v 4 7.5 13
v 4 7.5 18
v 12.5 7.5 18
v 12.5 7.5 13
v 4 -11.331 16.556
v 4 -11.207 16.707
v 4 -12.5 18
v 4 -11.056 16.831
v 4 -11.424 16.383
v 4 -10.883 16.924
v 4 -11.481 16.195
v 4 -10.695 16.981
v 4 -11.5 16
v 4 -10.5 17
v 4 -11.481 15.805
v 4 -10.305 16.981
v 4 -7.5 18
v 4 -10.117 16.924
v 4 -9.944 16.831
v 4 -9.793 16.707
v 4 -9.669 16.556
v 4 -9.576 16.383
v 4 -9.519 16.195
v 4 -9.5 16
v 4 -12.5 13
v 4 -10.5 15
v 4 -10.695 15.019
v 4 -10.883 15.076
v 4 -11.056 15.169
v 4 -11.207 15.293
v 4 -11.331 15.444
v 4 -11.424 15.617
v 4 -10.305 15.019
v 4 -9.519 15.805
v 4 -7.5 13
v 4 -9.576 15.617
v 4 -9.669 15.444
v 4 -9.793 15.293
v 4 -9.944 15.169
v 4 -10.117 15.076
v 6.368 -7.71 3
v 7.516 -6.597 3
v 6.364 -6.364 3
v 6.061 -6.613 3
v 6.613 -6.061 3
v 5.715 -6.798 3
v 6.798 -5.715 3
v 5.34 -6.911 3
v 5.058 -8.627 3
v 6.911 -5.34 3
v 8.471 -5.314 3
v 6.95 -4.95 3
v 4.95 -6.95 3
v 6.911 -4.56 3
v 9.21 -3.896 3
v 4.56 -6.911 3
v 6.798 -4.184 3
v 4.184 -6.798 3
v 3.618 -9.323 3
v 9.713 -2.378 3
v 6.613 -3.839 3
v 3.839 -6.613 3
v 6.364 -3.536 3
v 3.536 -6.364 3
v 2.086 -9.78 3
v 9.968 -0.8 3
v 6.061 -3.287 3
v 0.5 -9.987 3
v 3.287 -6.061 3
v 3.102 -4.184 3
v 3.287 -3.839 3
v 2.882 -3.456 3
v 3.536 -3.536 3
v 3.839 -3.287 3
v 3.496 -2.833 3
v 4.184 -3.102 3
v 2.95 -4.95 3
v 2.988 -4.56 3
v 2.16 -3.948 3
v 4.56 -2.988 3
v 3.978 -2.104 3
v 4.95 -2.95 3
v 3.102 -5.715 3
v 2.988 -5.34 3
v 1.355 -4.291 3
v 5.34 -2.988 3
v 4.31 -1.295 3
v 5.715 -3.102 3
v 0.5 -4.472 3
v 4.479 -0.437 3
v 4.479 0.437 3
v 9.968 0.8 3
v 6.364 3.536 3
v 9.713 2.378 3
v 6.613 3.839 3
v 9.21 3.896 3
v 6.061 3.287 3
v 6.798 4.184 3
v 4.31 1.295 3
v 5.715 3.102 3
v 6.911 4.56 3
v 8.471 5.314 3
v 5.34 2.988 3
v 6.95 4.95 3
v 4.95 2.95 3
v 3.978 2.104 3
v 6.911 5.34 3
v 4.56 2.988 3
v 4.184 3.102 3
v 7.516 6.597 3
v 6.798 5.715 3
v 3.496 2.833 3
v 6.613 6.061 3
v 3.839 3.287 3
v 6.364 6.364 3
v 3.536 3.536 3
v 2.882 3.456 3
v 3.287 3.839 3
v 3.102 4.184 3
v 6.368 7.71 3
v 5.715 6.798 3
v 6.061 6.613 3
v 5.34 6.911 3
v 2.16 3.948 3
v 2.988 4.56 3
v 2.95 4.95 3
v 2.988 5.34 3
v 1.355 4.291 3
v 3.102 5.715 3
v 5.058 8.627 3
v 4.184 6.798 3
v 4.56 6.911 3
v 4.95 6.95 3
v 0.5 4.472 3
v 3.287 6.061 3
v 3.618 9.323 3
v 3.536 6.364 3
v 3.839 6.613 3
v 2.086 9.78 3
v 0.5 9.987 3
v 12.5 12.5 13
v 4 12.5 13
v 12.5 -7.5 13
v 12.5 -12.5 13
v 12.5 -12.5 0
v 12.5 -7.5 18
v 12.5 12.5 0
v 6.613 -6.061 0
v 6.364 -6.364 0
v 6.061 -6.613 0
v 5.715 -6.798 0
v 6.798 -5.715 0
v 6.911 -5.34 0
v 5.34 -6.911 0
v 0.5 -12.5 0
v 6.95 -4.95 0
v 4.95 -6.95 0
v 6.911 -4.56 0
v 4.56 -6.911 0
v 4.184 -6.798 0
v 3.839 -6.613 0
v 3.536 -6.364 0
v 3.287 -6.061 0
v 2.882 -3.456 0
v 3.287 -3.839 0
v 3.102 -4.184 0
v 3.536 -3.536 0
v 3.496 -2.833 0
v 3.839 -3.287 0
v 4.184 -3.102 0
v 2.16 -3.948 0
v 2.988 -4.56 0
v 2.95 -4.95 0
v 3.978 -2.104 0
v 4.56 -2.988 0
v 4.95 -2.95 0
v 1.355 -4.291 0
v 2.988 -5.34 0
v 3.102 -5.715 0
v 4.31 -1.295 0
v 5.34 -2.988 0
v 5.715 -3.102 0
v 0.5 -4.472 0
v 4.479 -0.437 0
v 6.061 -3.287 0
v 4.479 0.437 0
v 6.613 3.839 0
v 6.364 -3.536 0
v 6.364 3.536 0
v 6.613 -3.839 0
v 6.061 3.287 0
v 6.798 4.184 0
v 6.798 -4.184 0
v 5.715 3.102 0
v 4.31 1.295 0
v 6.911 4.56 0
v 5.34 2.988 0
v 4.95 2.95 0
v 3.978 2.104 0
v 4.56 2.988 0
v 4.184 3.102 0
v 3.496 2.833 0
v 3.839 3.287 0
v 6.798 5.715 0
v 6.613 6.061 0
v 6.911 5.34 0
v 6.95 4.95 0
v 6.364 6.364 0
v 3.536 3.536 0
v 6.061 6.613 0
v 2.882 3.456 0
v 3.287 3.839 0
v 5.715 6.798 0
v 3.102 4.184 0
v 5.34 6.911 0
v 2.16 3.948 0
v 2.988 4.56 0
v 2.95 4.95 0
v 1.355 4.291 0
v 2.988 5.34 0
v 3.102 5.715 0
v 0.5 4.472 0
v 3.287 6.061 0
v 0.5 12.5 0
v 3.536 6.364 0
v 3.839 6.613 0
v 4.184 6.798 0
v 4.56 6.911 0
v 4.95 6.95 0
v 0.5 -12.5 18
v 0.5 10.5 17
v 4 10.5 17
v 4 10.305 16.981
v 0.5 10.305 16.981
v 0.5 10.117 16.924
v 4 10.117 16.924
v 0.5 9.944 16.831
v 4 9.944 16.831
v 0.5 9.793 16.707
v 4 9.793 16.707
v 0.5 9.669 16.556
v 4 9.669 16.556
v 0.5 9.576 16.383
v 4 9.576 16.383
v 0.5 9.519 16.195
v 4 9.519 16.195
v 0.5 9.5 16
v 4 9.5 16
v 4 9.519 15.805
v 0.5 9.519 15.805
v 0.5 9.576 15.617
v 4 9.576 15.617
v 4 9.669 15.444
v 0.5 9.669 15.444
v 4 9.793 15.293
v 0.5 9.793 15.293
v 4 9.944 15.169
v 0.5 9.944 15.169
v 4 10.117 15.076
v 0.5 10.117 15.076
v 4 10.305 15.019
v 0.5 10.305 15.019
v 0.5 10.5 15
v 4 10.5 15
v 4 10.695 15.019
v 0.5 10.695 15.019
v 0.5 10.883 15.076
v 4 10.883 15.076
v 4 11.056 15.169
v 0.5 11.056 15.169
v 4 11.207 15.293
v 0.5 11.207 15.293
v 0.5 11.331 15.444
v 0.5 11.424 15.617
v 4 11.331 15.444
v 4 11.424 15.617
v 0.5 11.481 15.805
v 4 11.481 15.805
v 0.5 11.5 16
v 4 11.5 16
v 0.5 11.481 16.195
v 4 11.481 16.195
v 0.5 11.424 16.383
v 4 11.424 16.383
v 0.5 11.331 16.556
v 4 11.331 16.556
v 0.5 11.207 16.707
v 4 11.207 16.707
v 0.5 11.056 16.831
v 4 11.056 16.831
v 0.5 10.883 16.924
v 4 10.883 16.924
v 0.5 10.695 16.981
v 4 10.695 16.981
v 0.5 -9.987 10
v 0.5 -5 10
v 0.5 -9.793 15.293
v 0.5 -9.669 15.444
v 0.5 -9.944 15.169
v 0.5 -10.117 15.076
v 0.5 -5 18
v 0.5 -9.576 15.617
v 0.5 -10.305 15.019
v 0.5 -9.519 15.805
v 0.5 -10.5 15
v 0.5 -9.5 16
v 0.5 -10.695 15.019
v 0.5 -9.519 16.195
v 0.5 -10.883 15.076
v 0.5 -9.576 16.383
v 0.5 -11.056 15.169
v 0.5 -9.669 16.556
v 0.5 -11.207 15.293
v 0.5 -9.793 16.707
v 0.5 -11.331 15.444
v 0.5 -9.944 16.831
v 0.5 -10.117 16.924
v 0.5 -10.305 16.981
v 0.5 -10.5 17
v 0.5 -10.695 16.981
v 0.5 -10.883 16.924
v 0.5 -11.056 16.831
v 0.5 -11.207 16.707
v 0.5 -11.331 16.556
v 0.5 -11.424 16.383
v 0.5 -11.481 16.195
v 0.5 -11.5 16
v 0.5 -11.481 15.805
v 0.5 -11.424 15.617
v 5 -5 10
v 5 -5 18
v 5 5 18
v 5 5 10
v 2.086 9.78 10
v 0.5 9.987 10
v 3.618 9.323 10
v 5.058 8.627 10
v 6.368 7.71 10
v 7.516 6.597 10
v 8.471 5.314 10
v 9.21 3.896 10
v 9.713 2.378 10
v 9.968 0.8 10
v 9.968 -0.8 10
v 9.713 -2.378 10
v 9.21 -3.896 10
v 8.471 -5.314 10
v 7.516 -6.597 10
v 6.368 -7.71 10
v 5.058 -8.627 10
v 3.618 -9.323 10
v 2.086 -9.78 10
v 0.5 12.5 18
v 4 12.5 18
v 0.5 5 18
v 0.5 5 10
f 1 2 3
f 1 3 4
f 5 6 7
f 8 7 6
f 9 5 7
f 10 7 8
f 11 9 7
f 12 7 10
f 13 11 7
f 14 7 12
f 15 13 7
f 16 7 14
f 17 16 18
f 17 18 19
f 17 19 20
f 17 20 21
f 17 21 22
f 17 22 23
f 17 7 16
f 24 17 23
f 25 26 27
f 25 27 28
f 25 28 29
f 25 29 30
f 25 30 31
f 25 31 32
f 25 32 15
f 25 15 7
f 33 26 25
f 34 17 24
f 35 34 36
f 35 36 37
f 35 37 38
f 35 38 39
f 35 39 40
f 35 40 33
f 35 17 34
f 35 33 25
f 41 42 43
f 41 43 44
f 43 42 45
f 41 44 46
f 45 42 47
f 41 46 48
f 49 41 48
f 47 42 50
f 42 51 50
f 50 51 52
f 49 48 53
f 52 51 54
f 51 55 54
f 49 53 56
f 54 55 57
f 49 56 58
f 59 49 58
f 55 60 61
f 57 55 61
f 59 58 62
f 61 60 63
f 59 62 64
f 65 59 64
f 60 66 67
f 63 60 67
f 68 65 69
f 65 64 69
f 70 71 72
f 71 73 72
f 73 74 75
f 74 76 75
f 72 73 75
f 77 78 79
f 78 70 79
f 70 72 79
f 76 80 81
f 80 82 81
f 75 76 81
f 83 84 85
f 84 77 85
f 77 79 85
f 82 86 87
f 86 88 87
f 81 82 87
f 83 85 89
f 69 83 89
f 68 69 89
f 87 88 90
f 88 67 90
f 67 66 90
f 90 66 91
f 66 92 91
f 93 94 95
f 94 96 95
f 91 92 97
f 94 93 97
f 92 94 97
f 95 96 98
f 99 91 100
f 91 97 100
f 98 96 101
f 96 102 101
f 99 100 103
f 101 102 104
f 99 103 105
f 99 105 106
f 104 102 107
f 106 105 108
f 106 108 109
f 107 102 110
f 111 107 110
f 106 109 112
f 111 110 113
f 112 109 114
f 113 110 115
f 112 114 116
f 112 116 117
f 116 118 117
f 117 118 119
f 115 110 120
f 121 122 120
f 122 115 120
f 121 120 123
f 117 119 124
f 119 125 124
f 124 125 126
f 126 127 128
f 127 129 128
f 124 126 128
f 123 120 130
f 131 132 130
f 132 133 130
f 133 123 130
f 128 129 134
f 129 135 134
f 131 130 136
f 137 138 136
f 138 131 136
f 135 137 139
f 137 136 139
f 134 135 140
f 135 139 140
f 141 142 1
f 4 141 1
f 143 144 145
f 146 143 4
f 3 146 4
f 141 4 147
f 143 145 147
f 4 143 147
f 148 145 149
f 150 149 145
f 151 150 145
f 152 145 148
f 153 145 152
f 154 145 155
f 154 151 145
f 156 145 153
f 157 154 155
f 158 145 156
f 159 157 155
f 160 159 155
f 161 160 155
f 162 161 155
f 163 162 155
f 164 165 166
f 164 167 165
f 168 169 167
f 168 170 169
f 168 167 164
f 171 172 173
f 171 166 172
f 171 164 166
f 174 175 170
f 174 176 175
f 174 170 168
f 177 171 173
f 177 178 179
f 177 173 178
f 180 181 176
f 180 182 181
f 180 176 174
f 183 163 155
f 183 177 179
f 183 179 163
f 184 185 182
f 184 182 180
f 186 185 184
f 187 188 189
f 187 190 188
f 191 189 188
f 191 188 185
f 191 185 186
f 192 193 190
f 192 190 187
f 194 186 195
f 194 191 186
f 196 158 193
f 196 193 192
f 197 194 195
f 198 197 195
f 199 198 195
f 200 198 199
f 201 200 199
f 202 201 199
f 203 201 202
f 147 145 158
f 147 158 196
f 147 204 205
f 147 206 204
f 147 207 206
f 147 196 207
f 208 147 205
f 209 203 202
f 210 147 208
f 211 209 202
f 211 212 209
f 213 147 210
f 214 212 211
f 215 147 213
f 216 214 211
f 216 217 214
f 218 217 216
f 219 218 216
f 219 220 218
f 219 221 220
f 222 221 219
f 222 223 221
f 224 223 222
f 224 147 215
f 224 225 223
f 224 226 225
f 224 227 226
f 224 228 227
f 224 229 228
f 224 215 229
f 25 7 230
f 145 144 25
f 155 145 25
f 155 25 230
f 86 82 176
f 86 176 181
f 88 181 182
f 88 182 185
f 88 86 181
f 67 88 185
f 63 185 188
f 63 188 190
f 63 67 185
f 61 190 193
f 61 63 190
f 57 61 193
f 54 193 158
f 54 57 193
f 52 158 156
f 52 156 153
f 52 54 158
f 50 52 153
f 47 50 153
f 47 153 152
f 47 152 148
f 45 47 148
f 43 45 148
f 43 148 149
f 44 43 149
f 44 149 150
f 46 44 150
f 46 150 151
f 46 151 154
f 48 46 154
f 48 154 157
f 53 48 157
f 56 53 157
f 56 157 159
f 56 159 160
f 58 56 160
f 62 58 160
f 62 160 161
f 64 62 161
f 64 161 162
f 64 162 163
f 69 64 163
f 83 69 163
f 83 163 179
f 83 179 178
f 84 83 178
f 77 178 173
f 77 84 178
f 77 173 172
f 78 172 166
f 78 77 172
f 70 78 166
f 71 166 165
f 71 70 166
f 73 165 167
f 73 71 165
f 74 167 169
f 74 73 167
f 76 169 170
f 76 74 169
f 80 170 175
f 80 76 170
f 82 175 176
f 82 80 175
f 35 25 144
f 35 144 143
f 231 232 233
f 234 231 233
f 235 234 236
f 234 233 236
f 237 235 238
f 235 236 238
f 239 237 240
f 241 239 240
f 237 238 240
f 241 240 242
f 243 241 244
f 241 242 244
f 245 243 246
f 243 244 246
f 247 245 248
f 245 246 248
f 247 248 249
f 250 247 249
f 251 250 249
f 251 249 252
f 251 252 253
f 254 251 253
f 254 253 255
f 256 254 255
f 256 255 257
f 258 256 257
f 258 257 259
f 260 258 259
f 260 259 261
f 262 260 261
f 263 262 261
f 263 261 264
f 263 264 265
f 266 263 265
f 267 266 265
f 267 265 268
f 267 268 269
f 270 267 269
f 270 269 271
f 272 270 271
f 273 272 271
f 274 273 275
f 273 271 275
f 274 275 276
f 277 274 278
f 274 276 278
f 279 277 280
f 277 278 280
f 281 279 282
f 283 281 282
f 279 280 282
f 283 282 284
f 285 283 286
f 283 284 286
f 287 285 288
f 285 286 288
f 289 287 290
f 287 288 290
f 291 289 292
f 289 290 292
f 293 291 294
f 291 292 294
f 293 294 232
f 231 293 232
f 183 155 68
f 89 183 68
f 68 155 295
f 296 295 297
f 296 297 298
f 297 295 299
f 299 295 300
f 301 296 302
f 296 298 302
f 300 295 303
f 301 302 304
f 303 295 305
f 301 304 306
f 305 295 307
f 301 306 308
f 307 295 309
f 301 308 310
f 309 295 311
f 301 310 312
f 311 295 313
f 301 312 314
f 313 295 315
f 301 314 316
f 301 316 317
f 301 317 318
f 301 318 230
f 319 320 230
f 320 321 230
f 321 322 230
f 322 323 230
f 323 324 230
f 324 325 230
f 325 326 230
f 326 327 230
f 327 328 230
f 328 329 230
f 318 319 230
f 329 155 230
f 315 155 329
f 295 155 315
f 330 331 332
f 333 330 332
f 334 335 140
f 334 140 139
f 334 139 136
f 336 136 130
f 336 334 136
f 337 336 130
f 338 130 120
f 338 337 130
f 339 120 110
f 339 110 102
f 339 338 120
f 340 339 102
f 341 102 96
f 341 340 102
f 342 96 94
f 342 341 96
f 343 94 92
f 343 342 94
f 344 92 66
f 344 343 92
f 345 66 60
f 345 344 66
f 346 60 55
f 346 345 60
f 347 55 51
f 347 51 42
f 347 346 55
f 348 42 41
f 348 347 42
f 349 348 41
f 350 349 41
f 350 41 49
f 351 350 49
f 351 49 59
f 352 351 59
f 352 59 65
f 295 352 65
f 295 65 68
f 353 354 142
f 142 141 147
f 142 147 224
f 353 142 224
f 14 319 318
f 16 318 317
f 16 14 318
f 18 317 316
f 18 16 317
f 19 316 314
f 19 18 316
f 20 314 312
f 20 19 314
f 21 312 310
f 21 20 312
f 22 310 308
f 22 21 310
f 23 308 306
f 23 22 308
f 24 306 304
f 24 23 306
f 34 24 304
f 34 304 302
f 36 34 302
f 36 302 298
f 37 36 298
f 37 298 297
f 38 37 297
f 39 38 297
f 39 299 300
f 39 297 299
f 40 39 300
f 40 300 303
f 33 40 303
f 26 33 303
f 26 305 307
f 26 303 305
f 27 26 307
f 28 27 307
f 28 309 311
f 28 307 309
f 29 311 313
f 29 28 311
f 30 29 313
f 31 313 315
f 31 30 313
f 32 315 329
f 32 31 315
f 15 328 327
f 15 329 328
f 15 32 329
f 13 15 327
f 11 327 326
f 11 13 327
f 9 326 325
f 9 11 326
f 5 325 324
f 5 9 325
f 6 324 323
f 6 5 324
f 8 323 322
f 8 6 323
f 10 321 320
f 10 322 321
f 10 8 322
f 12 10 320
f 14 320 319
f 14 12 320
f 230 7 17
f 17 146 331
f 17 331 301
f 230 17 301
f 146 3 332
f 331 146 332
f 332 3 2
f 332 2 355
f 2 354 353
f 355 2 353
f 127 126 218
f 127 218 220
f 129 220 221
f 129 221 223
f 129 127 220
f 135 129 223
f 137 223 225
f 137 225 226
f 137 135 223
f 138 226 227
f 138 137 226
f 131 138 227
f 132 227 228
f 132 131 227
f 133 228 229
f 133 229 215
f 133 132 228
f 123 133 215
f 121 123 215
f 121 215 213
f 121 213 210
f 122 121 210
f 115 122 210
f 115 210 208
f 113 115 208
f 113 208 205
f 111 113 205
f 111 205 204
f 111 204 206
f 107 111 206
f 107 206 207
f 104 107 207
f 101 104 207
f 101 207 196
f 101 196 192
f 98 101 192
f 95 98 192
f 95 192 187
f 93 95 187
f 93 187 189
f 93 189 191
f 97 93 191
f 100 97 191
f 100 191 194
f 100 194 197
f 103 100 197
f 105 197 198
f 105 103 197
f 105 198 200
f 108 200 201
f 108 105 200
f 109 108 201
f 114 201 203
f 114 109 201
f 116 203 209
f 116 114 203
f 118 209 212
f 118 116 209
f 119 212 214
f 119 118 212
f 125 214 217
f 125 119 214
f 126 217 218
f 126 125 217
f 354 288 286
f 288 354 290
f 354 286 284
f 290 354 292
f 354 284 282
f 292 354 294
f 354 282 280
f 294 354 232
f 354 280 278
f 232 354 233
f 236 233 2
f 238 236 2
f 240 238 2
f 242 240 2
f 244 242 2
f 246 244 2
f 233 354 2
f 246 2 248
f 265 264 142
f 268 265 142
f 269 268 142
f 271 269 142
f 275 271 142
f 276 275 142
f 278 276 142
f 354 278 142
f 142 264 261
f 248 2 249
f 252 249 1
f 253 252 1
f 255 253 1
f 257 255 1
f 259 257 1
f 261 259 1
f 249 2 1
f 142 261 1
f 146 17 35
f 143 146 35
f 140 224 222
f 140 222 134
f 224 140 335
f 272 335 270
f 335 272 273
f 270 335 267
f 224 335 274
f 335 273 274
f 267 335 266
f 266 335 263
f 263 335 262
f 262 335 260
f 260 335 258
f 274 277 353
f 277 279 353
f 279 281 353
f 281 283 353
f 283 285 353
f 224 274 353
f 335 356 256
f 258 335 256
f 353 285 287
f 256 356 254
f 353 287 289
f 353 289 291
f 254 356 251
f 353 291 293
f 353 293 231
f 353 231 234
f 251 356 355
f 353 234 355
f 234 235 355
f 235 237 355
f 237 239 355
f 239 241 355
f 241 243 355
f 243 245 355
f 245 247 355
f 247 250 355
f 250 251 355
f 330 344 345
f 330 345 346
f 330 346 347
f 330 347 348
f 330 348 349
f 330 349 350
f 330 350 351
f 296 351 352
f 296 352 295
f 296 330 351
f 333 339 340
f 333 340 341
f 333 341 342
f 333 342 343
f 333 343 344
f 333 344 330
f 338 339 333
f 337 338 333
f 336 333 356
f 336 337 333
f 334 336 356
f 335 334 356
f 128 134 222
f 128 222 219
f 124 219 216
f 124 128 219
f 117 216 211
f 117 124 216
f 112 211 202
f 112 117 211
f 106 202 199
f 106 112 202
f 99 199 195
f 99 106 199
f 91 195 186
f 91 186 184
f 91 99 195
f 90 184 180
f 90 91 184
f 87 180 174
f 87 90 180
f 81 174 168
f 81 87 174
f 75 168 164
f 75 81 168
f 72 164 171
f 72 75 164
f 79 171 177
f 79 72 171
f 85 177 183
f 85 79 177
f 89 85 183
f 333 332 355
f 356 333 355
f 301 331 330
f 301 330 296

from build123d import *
from build123d.topology import SkipClean

# Parameters (mm, degrees)
SKETCH_1_W               = 25
SKETCH_1_H               = 25
EXTRUDE_1_DEPTH          = 10
SKETCH_2_R               = 10
CUT_EXTRUDE_1_DEPTH      = 7
SKETCH_3_R               = 4.5
CUT_EXTRUDE_2_DEPTH      = 20.013153342
SKETCH_4_R               = 2
CUT_EXTRUDE_4_DEPTH      = 20.013153342
PATTERN_CIRCULAR_1_COUNT = 4
SKETCH_5_W               = 25
SKETCH_5_H               = 25
EXTRUDE_2_DEPTH          = 8
SKETCH_6_W               = 10
SKETCH_6_H               = 10
CUT_EXTRUDE_5_DEPTH      = 8
SKETCH_8_W               = 17.447834749
SKETCH_8_H               = 20.945056097
CUT_EXTRUDE_8_DEPTH      = 34.24530042
CUT_EXTRUDE_START        = -4
SKETCH_12_W              = 5
SKETCH_12_H              = 5
CUT_EXTRUDE_9_DEPTH      = 22.228951623
SKETCH_13_R              = 1
CUT_EXTRUDE_10_DEPTH     = 24.505318547
SKETCH_14_W              = 16.881791219
SKETCH_14_H              = 21.447400351
CUT_EXTRUDE_11_DEPTH     = 34.24530042


with BuildPart() as part:
    # 草图1 → 凸台-拉伸1 (new body)
    with BuildSketch(Plane.XY):
        Rectangle(SKETCH_1_W, SKETCH_1_H)
    extrude(amount=EXTRUDE_1_DEPTH)

    # 草图2 → 切除-拉伸1 (cut)
    with BuildSketch(Plane.XY.offset(10)):
        Circle(SKETCH_2_R)
    extrude(amount=-CUT_EXTRUDE_1_DEPTH, mode=Mode.SUBTRACT)

    # 草图3 → 切除-拉伸2 (cut, through all)
    with BuildSketch(Plane.XY.offset(3)):
        Circle(SKETCH_3_R)
    extrude(amount=-CUT_EXTRUDE_2_DEPTH, mode=Mode.SUBTRACT)

    # 草图4 → 切除-拉伸4 (cut, through all)
    with BuildSketch(Plane.XY.offset(3)):
        with Locations((-4.949747468, 4.949747468)):
            Circle(SKETCH_4_R)
    cut_extrude_4 = extrude(amount=-CUT_EXTRUDE_4_DEPTH, mode=Mode.SUBTRACT)

    # 阵列(圆周)1: 切除-拉伸4 ×4 about axis
    pattern_circular_1_axis = Axis((0, 0, 0), (0, 0, 1))
    for i in range(1, PATTERN_CIRCULAR_1_COUNT):
        add(cut_extrude_4.rotate(pattern_circular_1_axis, i * 360 / PATTERN_CIRCULAR_1_COUNT), mode=Mode.SUBTRACT)

    # 草图5 → 凸台-拉伸2 (add)
    with BuildSketch(Plane.XY.offset(10)):
        Rectangle(SKETCH_5_W, SKETCH_5_H)
    extrude(amount=EXTRUDE_2_DEPTH)

    # 草图6 → 切除-拉伸5 (cut)
    with BuildSketch(Plane.XY.offset(18)):
        Rectangle(SKETCH_6_W, SKETCH_6_H)
    extrude(amount=-CUT_EXTRUDE_5_DEPTH, mode=Mode.SUBTRACT)

    # 草图8 → 切除-拉伸8 (cut, through all)
    with BuildSketch(Plane.XZ.offset(12.5)):
        with Locations((8.723917375, 10.472528049)):
            Rectangle(SKETCH_8_W, SKETCH_8_H)
    extrude(amount=-CUT_EXTRUDE_8_DEPTH, mode=Mode.SUBTRACT)

    # 草图12 → 切除-拉伸9 (cut, through all)
    with BuildSketch(Plane(origin=(0, 0, 0), x_dir=(0, 0, -1), z_dir=(1, 0, 0)).offset(CUT_EXTRUDE_START)):
        with Locations((-15.5, -10)):
            Rectangle(SKETCH_12_W, SKETCH_12_H)
    cut_extrude_9 = extrude(amount=-CUT_EXTRUDE_9_DEPTH, mode=Mode.SUBTRACT)

    # 镜向1: 切除-拉伸9 across plane
    add(cut_extrude_9.mirror(Plane.ZX), mode=Mode.SUBTRACT)

    # 草图13 → 切除-拉伸10 (cut, through all)
    with BuildSketch(Plane.ZY.offset(4)):
        with Locations((16, -10.5)):
            Circle(SKETCH_13_R)
    cut_extrude_10 = extrude(amount=-CUT_EXTRUDE_10_DEPTH, mode=Mode.SUBTRACT)

    # 镜向2: 切除-拉伸10 across plane
    add(cut_extrude_10.mirror(Plane.ZX), mode=Mode.SUBTRACT)

    # 镜向3: part across plane


with BuildPart() as part_1:
    with SkipClean():  # the faces are left unmerged after this step: merging them gives an invalid solid
        add(part.part)
        add(part.part.mirror(Plane(origin=(0, 12.5, 0), x_dir=(0, 0, 1), z_dir=(-1, 0, 0))))

    # 草图14 → 切除-拉伸11 (cut, through all)
    with BuildSketch(Plane.XZ.offset(12.5)):
        with Locations((-7.94089561, 10.723700176)):
            Rectangle(SKETCH_14_W, SKETCH_14_H)
    extrude(amount=-CUT_EXTRUDE_11_DEPTH, mode=Mode.SUBTRACT)


solid = part_1.part
